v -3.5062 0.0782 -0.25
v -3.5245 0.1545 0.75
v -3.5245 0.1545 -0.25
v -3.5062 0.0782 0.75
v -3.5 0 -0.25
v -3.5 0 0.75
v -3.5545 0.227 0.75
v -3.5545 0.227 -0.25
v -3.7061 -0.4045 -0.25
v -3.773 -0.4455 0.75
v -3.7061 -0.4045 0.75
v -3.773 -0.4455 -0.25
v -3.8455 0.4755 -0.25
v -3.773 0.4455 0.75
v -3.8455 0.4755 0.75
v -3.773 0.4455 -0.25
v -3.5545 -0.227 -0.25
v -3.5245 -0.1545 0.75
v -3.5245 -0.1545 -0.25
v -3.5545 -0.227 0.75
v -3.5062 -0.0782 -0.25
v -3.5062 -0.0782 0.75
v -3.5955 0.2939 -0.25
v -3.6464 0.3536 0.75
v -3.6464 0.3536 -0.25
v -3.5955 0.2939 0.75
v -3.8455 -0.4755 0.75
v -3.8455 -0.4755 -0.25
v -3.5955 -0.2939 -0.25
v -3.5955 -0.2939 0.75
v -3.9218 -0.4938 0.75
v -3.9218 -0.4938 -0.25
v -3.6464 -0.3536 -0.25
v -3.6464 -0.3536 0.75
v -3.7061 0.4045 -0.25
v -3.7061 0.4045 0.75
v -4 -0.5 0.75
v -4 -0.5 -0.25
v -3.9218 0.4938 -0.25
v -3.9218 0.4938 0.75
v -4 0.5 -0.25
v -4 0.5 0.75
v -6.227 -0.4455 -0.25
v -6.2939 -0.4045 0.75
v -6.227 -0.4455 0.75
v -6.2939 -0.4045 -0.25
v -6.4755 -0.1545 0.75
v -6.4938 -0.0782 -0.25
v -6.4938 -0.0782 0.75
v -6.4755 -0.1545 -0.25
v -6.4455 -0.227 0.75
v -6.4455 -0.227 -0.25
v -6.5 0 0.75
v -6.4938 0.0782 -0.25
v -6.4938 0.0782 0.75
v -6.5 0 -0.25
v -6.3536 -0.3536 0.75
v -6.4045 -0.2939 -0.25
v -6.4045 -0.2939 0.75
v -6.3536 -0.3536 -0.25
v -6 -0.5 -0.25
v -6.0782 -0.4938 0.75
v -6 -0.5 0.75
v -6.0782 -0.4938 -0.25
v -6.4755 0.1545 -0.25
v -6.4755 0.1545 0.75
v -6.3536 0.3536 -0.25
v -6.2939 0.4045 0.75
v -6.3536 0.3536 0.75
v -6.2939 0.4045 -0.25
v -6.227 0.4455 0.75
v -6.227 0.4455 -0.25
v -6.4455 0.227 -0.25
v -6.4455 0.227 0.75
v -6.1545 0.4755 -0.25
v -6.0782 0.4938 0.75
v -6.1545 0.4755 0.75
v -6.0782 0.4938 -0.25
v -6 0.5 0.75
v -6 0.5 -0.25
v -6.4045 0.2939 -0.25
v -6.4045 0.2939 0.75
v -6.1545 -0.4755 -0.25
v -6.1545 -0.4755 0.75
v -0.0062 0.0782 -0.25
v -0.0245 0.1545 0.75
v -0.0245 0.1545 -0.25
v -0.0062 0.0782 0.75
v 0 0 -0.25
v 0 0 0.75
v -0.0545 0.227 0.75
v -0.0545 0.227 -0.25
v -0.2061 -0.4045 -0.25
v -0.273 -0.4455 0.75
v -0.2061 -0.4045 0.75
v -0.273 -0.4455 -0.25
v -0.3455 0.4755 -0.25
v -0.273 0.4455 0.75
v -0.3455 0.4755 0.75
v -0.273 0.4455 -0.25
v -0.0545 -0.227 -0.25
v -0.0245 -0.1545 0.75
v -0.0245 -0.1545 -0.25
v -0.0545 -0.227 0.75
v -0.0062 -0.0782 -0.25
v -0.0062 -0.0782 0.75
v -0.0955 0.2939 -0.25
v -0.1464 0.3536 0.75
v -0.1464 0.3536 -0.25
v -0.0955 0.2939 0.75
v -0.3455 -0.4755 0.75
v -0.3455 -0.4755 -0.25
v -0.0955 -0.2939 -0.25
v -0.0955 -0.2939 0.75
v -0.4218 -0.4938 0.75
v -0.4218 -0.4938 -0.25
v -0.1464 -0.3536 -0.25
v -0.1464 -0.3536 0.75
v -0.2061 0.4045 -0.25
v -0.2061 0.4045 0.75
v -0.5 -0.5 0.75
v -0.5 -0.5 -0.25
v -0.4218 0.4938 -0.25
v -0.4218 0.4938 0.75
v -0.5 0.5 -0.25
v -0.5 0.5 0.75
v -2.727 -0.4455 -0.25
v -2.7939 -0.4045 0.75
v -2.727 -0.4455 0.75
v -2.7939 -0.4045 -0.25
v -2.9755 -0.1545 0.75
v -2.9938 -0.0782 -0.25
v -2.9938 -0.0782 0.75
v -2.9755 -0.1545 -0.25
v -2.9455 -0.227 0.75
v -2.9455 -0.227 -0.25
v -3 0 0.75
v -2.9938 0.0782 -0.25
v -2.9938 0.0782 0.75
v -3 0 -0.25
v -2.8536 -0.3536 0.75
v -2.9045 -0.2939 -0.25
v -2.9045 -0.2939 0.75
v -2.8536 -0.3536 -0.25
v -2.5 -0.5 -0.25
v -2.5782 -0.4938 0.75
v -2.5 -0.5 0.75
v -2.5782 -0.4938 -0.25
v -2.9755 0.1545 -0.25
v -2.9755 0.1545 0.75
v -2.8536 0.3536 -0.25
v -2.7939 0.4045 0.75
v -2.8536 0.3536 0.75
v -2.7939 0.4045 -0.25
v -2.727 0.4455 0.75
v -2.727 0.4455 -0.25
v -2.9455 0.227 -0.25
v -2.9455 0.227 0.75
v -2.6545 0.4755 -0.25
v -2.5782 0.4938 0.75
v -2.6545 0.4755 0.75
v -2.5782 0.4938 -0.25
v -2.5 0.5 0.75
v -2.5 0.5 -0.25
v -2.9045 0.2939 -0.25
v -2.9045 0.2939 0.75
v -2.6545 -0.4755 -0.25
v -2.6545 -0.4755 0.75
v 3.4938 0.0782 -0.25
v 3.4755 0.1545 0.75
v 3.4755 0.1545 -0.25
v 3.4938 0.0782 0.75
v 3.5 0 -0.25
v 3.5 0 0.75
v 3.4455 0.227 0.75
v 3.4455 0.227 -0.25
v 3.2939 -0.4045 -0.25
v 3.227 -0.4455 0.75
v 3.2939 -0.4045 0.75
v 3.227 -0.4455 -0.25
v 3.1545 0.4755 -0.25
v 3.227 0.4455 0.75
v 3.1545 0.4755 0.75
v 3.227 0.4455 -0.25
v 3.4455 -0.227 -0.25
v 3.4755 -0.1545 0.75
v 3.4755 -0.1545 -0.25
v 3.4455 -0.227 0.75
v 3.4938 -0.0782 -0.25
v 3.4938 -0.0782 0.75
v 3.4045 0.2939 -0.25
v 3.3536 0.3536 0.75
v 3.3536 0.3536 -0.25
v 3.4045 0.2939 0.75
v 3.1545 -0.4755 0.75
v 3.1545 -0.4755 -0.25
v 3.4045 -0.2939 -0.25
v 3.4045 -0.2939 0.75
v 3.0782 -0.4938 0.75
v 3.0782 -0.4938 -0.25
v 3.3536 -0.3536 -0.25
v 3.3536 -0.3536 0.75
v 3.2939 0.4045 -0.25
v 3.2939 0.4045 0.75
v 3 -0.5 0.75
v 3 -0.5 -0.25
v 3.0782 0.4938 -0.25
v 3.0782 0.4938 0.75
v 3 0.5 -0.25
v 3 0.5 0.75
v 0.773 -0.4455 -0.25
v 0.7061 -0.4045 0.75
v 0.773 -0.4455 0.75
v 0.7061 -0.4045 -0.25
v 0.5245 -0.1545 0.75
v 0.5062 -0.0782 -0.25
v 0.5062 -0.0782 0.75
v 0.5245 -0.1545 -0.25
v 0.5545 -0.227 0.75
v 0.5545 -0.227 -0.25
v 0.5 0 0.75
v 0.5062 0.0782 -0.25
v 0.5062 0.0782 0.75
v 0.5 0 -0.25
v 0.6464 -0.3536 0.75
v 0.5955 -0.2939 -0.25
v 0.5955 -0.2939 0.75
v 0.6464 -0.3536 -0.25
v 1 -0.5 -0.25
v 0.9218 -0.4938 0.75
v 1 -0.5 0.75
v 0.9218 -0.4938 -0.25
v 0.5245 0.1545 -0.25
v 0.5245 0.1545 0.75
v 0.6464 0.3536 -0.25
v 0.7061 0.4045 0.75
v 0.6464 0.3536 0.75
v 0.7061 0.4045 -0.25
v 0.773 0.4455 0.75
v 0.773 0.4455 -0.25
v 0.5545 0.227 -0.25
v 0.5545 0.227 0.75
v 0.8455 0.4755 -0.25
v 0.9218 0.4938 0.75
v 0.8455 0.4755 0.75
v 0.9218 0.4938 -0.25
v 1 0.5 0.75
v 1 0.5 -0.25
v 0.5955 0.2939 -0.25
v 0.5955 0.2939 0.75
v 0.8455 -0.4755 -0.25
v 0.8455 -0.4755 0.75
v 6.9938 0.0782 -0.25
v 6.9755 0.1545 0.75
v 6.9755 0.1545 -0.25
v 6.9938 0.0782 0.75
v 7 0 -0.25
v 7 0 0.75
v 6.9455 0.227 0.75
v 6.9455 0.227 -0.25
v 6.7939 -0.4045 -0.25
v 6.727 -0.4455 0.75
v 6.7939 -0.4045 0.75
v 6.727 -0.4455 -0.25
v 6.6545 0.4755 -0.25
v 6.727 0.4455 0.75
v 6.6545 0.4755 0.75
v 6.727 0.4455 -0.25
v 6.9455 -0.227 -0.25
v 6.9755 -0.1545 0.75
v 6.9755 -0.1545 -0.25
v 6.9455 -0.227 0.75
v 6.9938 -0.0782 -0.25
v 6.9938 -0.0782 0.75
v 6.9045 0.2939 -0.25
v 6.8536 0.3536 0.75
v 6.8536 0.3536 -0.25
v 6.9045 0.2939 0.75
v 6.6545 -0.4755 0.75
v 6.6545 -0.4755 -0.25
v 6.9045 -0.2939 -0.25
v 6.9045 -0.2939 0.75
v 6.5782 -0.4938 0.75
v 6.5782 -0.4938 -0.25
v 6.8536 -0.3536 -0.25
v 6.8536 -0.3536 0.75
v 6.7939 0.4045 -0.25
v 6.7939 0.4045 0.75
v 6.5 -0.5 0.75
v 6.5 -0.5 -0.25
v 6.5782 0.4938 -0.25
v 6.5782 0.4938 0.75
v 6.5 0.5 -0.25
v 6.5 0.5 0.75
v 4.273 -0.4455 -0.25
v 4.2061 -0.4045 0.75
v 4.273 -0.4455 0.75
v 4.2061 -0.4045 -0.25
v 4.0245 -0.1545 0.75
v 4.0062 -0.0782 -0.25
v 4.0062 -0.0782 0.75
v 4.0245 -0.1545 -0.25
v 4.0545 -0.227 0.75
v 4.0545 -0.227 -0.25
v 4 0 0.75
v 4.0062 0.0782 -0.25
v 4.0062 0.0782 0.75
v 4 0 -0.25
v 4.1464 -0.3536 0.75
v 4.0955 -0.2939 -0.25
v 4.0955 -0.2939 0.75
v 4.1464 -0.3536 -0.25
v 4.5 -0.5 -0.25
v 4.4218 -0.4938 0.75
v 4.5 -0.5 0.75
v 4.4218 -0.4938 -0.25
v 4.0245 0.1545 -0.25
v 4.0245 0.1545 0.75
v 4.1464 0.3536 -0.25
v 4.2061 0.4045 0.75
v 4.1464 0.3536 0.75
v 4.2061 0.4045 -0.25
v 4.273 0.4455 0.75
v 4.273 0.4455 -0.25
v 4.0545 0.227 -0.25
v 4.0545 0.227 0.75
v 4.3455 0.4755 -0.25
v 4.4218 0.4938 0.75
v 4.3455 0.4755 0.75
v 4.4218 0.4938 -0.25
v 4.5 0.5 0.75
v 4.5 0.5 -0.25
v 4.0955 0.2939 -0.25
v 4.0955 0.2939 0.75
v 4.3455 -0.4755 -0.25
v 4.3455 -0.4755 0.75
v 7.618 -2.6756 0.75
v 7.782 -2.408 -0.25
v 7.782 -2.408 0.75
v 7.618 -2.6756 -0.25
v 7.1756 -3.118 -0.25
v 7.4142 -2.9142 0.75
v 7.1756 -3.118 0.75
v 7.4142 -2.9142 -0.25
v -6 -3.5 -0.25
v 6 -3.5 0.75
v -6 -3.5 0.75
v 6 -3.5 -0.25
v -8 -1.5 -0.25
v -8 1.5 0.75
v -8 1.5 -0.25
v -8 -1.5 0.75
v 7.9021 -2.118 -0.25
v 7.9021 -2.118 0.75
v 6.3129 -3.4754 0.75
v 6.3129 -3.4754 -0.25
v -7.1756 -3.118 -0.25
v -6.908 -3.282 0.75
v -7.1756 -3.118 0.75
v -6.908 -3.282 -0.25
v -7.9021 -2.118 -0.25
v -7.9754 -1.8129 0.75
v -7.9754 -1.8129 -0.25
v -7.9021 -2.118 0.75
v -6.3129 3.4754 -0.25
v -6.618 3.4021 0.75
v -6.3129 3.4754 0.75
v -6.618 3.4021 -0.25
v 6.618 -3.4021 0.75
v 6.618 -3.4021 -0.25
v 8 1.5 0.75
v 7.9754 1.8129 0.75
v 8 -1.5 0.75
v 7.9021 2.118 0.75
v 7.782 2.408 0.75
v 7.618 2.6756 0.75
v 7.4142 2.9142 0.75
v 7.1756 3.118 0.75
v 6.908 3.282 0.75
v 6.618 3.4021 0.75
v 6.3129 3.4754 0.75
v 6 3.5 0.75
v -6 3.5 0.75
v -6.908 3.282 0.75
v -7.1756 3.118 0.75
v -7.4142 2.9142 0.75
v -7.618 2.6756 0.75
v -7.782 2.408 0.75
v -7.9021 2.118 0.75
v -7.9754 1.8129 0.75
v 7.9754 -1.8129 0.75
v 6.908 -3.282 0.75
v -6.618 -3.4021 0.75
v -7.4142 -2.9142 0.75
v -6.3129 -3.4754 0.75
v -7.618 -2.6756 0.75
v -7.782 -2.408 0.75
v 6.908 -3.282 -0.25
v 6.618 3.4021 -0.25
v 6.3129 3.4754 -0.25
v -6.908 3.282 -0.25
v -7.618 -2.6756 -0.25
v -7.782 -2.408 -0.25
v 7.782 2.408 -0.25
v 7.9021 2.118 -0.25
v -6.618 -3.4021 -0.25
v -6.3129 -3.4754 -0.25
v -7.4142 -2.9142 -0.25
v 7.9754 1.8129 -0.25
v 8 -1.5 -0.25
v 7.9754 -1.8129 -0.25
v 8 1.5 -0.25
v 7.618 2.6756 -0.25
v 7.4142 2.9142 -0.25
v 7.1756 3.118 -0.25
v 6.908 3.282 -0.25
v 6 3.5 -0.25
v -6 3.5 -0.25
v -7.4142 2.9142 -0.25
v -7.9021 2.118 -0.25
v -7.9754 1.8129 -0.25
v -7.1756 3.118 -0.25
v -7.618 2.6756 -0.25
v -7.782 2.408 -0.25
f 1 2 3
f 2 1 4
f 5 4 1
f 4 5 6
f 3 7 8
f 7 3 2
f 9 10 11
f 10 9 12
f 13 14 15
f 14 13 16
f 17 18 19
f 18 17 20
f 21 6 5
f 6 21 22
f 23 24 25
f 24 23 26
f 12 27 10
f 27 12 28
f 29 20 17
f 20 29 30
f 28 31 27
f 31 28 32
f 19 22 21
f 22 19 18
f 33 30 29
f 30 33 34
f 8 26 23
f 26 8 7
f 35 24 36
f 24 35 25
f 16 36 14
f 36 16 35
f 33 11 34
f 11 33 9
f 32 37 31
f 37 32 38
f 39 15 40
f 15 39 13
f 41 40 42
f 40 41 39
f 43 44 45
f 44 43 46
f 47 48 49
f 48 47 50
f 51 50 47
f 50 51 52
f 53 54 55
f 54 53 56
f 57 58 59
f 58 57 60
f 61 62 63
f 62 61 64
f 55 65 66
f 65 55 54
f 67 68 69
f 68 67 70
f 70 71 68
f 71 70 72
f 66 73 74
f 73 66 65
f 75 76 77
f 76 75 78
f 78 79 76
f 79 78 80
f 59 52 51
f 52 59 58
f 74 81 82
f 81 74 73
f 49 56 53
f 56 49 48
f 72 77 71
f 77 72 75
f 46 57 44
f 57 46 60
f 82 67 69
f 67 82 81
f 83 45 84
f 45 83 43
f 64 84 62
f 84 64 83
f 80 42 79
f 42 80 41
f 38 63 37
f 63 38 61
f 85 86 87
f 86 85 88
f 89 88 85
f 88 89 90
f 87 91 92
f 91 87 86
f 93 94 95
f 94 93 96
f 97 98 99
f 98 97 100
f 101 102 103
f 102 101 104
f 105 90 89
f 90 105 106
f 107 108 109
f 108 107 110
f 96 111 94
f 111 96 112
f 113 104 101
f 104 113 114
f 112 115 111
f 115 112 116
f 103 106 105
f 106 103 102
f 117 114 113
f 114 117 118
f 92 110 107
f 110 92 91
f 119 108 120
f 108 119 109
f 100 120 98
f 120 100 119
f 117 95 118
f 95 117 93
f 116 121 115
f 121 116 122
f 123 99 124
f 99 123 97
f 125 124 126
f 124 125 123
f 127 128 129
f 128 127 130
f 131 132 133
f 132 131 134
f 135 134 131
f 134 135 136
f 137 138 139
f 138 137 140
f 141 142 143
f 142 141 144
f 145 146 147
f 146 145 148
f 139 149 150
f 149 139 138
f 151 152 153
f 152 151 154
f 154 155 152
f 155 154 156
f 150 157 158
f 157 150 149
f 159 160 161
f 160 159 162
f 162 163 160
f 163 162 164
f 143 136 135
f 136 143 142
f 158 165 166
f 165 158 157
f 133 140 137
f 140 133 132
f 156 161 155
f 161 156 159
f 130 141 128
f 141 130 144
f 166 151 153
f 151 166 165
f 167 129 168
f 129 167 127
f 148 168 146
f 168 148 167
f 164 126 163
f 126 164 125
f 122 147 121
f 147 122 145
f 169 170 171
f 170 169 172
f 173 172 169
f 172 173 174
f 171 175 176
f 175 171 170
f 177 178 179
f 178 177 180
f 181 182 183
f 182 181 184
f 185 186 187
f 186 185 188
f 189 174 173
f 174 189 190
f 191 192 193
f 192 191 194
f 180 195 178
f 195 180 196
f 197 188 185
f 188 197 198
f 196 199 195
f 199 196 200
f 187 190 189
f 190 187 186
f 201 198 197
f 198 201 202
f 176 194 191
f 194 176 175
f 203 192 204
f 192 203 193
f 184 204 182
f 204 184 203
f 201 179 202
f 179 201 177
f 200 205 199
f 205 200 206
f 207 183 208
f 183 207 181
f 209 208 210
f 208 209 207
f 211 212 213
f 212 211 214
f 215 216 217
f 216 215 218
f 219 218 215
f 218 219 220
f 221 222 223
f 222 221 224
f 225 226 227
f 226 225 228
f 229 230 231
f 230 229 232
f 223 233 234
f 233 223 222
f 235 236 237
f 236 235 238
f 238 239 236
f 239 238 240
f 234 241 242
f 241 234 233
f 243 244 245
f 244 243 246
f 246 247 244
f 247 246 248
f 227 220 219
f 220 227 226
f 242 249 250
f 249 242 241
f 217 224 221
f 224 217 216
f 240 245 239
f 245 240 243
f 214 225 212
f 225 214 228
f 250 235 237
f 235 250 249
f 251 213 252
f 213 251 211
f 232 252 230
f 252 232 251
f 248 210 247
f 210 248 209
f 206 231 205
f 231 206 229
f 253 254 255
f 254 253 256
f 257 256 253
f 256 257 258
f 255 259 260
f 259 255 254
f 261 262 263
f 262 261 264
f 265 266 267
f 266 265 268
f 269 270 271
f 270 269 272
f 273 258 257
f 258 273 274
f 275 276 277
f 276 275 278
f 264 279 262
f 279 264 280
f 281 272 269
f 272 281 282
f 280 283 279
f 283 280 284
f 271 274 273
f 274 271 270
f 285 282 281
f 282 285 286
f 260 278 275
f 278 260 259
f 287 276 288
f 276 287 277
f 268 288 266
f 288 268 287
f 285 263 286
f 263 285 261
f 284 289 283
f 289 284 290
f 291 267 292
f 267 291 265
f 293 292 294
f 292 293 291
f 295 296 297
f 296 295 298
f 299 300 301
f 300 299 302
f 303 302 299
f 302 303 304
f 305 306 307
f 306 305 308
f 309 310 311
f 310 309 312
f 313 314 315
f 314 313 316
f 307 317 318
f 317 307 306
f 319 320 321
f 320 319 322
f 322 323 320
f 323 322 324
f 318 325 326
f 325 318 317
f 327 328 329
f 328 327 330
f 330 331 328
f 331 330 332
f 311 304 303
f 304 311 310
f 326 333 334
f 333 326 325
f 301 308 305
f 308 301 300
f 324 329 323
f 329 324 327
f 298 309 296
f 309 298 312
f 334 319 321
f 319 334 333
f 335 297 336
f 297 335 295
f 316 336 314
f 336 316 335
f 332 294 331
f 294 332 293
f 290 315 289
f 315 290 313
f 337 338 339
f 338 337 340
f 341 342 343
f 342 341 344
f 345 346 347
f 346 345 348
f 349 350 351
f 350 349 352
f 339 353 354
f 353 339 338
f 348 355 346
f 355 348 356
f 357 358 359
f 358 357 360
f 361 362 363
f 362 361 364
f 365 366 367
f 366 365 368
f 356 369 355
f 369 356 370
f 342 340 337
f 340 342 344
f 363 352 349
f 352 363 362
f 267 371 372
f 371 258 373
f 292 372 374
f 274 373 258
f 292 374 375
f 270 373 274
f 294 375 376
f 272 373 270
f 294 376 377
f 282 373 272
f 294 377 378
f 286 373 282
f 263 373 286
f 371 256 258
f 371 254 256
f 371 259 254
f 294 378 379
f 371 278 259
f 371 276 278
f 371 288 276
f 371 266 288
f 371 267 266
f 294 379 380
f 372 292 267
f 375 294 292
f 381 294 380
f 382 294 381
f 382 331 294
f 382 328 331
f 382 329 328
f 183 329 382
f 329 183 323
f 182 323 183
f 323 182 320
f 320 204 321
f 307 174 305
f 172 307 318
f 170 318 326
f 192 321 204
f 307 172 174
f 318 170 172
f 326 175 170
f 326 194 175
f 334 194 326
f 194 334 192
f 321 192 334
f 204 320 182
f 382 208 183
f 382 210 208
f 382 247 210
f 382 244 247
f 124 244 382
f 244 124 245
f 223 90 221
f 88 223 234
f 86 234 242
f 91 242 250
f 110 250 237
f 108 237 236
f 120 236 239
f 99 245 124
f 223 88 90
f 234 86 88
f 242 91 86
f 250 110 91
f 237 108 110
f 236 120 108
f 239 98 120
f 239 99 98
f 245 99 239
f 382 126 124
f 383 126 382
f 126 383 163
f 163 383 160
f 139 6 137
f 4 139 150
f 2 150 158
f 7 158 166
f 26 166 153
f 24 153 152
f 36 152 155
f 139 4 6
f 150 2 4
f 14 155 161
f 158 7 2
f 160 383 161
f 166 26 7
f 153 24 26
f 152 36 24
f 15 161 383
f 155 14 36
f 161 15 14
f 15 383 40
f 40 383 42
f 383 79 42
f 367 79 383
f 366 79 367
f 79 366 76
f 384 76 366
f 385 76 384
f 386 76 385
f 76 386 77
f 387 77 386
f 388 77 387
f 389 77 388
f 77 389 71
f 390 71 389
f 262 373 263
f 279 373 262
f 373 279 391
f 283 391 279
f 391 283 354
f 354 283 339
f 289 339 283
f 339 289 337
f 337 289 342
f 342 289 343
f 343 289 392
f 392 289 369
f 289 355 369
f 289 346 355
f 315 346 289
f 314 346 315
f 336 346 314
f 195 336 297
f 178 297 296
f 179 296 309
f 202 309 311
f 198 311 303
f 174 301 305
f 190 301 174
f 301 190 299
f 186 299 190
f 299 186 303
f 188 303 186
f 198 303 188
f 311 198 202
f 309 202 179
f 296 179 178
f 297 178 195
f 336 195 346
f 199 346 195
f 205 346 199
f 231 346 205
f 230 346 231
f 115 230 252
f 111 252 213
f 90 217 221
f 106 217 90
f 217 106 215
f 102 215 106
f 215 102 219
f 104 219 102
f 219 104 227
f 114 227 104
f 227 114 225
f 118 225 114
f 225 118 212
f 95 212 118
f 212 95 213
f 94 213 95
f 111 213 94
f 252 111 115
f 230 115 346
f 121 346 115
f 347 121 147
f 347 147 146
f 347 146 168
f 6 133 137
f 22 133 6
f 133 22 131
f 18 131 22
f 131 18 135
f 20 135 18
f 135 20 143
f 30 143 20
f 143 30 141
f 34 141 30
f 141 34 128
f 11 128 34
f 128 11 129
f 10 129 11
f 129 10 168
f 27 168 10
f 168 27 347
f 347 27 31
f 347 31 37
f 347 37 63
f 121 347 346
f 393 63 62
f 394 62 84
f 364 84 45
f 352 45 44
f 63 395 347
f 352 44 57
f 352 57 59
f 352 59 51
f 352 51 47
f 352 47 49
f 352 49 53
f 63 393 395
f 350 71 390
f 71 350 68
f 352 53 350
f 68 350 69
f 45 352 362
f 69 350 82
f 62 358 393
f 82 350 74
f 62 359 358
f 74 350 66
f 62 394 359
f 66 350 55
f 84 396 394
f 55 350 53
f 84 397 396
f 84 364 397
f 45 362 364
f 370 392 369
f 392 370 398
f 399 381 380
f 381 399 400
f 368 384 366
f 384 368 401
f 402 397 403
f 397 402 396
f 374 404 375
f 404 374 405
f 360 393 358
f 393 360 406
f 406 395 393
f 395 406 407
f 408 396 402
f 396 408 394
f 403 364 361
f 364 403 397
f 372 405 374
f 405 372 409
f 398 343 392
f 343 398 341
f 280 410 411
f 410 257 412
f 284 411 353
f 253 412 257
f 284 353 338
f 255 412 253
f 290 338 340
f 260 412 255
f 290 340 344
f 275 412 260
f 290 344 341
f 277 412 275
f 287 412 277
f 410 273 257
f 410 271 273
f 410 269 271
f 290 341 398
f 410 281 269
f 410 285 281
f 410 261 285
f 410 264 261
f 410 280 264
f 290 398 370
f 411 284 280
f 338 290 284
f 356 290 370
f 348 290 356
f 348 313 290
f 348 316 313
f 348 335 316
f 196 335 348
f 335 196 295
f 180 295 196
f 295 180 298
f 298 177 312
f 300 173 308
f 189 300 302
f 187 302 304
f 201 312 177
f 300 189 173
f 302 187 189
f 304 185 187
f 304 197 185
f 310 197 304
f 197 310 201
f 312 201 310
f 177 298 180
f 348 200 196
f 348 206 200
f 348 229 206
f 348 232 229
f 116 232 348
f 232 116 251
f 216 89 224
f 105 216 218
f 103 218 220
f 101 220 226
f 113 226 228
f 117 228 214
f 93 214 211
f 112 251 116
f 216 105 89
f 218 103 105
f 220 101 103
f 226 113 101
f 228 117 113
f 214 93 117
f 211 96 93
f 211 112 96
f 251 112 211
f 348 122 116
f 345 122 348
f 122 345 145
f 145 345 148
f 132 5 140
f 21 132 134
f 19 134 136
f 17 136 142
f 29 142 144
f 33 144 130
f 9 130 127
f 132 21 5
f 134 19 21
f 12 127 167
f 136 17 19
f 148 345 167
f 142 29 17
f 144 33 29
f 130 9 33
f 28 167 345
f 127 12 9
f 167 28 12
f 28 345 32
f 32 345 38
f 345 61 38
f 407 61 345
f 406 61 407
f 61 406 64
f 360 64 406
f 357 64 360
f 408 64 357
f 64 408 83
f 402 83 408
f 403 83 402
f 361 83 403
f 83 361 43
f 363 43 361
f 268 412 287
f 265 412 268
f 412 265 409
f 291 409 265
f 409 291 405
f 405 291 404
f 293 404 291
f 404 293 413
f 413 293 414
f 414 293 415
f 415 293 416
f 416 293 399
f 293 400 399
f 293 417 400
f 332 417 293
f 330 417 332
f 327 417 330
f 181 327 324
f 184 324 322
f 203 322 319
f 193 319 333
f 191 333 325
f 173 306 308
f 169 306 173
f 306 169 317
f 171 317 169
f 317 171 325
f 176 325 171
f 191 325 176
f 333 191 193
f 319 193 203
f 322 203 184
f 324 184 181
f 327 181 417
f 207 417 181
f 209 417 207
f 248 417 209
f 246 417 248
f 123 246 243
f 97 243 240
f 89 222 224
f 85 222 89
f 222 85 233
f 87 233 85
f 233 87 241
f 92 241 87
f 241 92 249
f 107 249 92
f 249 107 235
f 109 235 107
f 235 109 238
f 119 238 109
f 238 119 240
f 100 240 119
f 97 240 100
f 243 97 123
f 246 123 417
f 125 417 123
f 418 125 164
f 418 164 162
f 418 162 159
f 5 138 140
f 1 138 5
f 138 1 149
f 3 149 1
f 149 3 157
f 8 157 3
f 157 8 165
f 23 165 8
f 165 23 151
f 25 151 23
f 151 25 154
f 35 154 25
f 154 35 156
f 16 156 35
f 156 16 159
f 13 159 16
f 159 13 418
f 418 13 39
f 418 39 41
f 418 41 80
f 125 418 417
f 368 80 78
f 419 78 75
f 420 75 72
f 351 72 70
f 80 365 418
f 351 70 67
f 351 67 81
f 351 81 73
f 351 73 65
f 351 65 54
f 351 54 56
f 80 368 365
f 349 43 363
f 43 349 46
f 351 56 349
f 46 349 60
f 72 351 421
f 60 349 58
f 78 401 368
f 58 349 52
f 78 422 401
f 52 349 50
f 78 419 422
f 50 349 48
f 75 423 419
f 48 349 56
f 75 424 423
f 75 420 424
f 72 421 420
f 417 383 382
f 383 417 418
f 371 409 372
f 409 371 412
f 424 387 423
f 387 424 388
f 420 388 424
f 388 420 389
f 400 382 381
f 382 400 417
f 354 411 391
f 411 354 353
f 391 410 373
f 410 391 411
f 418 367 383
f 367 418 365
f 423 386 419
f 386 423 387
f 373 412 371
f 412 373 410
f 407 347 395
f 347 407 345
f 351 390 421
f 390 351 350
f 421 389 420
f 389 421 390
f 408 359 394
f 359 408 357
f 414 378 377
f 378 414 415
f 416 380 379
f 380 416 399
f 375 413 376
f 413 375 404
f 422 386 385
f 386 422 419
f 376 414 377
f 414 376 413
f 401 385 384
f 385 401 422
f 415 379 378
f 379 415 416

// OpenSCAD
module Piece_02(){
    module Mech_Piece_01(){

    Key_Lenght = 10;
    Key_Height = 10;
    Key_Width = 15;

    color("#a8b0b2")
    union(){
        translate([1,0,0])
        cylinder(5,0.5,0.5, $fn=40, center=true);
        translate([-1,0,0])
        cylinder(5,0.5,0.5, $fn=40, center=true);
        cube([2,1,5],center = true);
    }

    }
    difference(){
        minkowski(){
            cube([12,3,0.5],center = true);
            translate([0,0,0], $fn = 40)
            cylinder(0.5,2,2);
            }
                for (i=[-5:3.5:7]) {
                    translate([i,0,0]){
                    Mech_Piece_01();
                    }

                }

    }
}

Piece_02();


// Written by Nicolì Angelo (Gengio) 2024: 
// MIT License

//Permission is hereby granted, free of charge, to any person obtaining a copy of this software and associated documentation files (the "Software"), to deal in the Software without restriction, including without limitation the rights to use, copy, modify, merge, publish, distribute, sublicense, and/or sell copies of the Software, and to permit persons to whom the Software is furnished to do so, subject to the following conditions:

//The above copyright notice and this permission notice shall be included in all copies or substantial portions of the Software.

//THE SOFTWARE IS PROVIDED "AS IS", WITHOUT WARRANTY OF ANY KIND, EXPRESS OR IMPLIED, INCLUDING BUT NOT LIMITED TO THE WARRANTIES OF MERCHANTABILITY, FITNESS FOR A PARTICULAR PURPOSE AND NONINFRINGEMENT. IN NO EVENT SHALL THE AUTHORS OR COPYRIGHT HOLDERS BE LIABLE FOR ANY CLAIM, DAMAGES OR OTHER LIABILITY, WHETHER IN AN ACTION OF CONTRACT, TORT OR OTHERWISE, ARISING FROM, OUT OF OR IN CONNECTION WITH THE SOFTWARE OR THE USE OR OTHER DEALINGS IN THE SOFTWARE.
